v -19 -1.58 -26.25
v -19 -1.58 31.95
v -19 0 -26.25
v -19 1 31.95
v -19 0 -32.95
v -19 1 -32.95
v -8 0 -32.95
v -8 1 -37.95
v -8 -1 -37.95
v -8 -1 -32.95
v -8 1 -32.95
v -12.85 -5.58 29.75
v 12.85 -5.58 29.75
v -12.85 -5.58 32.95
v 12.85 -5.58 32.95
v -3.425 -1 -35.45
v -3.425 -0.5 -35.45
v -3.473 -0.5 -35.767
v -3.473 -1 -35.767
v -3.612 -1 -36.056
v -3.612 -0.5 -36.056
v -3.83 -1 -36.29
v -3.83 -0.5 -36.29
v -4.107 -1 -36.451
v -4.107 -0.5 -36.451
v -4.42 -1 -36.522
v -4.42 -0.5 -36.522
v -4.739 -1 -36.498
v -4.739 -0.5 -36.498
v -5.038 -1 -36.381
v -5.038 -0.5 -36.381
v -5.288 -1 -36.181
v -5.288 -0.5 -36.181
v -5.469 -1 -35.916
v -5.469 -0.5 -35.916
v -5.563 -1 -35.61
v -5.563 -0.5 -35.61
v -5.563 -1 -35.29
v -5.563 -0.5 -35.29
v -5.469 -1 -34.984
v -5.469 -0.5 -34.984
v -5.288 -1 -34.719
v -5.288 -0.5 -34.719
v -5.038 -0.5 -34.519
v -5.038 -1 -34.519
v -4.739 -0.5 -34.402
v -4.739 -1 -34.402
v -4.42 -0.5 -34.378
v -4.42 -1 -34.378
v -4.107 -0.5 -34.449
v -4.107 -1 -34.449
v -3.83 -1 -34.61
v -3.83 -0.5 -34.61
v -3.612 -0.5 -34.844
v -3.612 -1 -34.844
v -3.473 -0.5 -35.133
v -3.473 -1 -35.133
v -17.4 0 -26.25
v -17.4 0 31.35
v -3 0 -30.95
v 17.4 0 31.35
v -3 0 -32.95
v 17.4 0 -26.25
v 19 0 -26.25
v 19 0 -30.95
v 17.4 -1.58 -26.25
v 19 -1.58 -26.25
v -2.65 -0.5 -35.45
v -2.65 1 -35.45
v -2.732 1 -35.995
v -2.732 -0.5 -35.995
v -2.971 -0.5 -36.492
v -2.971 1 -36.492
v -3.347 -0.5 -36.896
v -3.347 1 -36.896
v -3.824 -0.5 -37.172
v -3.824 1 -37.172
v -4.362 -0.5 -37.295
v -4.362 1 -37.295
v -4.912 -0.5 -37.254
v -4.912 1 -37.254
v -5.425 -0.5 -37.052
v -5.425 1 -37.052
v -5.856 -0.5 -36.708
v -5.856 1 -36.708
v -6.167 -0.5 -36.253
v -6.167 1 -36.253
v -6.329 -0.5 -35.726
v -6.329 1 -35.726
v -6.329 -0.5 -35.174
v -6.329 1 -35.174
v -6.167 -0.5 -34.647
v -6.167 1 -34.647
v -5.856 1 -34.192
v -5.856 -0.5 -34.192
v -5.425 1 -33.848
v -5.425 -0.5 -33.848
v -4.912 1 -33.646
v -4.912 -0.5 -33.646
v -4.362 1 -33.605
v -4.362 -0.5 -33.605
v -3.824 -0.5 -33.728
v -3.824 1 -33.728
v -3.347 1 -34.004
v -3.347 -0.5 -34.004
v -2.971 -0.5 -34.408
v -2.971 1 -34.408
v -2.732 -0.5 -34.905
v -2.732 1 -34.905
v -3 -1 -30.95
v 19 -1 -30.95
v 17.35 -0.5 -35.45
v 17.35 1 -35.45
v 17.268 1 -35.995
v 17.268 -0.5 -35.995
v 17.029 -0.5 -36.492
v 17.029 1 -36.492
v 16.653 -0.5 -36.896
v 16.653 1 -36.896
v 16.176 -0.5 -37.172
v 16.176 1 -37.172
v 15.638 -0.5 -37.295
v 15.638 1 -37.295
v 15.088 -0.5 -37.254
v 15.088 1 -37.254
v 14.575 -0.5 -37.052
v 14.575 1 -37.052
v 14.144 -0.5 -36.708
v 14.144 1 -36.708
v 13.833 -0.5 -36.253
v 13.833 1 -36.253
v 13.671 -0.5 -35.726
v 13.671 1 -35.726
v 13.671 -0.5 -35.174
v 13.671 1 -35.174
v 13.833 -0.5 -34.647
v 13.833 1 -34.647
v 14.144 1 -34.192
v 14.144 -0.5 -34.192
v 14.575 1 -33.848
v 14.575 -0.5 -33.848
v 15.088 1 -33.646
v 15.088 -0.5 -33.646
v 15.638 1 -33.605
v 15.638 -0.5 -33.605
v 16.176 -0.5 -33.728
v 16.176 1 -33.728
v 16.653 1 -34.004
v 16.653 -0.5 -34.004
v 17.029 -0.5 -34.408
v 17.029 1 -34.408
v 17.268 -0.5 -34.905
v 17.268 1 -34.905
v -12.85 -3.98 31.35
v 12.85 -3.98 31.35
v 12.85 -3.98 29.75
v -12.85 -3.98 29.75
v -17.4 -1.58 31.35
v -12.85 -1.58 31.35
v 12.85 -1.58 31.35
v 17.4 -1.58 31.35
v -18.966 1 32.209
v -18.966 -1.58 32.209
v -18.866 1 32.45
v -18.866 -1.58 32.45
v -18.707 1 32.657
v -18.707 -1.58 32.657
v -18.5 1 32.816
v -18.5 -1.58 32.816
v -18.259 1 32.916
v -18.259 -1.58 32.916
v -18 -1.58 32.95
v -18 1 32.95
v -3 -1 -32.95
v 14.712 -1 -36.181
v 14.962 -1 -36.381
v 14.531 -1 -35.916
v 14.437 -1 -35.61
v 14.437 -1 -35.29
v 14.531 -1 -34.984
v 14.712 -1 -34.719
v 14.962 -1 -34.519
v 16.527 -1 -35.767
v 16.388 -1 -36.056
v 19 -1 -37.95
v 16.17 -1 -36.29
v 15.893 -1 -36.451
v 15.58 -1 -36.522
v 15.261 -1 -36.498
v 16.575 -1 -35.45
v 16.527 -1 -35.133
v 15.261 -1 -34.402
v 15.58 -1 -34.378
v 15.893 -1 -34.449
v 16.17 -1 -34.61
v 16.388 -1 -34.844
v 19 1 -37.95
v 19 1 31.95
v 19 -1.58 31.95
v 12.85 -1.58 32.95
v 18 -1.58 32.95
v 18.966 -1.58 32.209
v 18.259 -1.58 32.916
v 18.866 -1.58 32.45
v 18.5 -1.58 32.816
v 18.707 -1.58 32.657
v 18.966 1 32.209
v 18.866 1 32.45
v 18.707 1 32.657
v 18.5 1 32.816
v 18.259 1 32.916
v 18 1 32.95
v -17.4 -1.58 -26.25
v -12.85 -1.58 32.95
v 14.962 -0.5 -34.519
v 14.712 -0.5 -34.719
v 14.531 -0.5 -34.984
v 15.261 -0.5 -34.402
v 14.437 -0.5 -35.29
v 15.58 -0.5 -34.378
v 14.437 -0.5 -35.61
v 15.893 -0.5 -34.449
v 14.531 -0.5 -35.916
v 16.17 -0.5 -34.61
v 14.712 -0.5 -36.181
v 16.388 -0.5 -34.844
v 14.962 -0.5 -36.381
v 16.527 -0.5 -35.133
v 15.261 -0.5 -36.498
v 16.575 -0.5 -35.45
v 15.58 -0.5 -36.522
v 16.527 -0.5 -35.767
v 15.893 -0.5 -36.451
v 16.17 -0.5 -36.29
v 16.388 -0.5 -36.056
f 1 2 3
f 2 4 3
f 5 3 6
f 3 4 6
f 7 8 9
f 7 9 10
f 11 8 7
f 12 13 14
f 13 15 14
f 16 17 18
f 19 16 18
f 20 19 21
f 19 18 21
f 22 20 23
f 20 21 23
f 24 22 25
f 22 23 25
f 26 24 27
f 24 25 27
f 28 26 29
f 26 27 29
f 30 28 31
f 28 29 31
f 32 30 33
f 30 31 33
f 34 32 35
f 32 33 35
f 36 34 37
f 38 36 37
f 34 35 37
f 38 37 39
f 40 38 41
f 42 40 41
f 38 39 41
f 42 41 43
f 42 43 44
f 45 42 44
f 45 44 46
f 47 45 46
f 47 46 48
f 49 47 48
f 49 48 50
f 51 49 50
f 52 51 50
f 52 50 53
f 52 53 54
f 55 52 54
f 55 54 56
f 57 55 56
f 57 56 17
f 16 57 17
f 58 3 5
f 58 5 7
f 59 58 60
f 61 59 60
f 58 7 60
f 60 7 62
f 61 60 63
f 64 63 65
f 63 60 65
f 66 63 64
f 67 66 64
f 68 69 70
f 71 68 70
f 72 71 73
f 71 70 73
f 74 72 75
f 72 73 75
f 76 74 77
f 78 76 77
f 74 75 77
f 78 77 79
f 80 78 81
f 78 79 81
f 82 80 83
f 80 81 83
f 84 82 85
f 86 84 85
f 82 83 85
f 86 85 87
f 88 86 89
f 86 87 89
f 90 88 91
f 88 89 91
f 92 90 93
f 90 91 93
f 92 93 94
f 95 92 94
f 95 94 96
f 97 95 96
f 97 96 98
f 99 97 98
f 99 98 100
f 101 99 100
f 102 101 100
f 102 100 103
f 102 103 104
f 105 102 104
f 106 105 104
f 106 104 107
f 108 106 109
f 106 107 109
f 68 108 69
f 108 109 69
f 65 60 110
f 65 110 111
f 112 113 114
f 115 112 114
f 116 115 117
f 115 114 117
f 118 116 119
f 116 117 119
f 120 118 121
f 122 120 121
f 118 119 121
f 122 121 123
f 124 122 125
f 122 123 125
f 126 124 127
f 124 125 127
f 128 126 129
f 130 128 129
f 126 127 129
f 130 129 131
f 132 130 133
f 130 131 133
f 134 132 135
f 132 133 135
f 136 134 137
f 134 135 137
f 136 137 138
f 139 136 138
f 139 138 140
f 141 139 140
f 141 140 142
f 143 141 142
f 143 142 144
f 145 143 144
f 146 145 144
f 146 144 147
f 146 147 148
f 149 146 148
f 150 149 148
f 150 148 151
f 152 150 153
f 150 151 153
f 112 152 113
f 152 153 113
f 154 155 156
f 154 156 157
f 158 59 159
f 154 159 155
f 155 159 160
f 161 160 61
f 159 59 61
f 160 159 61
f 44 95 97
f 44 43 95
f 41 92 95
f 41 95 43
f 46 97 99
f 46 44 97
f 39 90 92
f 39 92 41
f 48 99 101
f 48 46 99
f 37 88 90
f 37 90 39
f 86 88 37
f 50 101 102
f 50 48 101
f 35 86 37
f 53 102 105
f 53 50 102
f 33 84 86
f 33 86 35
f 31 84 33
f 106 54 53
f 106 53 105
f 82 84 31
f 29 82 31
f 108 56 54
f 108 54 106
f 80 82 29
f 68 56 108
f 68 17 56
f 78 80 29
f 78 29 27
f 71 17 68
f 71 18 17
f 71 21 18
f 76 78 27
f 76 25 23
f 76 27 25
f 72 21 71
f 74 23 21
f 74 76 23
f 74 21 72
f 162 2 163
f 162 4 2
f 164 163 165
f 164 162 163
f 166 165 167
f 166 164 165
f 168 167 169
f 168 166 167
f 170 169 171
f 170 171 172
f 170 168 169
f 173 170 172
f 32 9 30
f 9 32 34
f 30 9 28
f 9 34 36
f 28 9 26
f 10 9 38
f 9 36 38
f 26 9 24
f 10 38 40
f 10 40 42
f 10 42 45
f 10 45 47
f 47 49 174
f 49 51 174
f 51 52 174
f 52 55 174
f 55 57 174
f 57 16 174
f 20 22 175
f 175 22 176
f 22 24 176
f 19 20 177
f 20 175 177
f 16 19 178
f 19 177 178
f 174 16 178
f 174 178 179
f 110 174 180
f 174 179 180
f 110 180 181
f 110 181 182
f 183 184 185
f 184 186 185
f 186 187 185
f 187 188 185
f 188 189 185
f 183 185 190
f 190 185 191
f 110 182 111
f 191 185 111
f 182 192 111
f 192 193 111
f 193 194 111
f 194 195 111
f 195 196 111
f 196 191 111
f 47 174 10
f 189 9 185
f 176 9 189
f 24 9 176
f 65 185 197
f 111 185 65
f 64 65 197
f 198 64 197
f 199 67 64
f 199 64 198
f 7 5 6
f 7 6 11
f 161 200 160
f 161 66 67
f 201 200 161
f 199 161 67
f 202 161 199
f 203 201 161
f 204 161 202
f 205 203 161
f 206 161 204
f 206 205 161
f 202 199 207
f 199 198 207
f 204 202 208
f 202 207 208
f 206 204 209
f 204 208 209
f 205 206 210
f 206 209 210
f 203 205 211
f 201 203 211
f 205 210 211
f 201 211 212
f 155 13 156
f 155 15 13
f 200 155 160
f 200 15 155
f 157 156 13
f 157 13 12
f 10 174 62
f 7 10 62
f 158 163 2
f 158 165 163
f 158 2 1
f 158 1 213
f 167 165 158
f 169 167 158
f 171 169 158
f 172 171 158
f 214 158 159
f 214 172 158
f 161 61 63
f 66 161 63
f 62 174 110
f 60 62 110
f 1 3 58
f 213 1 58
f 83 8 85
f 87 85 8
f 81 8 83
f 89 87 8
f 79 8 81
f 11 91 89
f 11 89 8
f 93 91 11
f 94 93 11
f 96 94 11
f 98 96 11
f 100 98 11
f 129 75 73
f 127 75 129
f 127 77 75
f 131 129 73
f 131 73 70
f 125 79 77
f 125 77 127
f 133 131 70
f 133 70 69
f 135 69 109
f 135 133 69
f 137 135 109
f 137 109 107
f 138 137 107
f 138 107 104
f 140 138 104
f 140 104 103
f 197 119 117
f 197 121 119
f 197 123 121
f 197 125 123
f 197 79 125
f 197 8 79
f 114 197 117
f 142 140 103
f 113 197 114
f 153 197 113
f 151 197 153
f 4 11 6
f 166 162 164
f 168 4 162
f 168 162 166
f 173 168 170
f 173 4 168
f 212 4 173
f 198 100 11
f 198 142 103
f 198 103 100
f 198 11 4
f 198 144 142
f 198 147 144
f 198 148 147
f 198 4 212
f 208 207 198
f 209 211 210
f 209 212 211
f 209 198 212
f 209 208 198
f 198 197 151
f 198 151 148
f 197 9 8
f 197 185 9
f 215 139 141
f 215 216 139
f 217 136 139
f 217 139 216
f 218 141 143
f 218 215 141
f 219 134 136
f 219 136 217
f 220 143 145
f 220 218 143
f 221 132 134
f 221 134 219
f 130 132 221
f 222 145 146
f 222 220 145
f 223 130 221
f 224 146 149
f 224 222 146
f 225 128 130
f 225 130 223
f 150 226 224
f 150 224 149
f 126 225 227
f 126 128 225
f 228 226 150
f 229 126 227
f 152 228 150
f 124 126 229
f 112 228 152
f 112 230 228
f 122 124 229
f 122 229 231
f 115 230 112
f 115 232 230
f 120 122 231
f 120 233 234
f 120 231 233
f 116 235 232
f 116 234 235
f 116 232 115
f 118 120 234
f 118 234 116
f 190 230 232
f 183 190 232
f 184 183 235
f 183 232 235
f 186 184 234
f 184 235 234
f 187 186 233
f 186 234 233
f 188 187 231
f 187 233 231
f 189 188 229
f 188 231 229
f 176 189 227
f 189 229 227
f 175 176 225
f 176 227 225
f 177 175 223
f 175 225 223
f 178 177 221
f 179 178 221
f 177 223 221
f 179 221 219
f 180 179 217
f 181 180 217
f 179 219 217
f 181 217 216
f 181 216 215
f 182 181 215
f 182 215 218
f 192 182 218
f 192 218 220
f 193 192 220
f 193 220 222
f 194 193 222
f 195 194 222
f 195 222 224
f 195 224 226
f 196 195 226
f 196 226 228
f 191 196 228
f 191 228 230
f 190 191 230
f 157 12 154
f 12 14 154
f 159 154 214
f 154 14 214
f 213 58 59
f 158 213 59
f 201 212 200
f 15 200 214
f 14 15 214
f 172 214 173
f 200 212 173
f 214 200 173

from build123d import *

# Parameters (mm, degrees)
SKETCH1_W                = 38
SKETCH1_H                = 65.9
BOSS_EXTRUDE1_DEPTH      = 1
BOSS_EXTRUDE2_DEPTH      = 1.58
SKETCH3_W                = 25.7
SKETCH3_H                = 1.6
BOSS_EXTRUDE3_DEPTH      = 4
SKETCH4_W                = 25.7
SKETCH4_H                = 1.6
BOSS_EXTRUDE4_DEPTH      = 1.6
FILLET1_R                = 1
SKETCH6_W                = 22
SKETCH6_H                = 7
BOSS_EXTRUDE5_DEPTH      = 1
BOSS_EXTRUDE5_DEPTH_BACK = 1
SKETCH9_W                = 5
SKETCH9_H                = 2
BOSS_EXTRUDE6_DEPTH      = 5
SKETCH7_R                = 1.075
CUT_EXTRUDE2_DEPTH       = 7.58
SKETCH8_R                = 1.85
CUT_EXTRUDE3_DEPTH       = 1.5


with BuildPart() as part:
    # Sketch1 → Boss-Extrude1 (new body)
    with BuildSketch(Plane(origin=(0, 0, 0), x_dir=(1, 0, 0), z_dir=(0, 1, 0))):
        Rectangle(SKETCH1_W, SKETCH1_H)
    extrude(amount=BOSS_EXTRUDE1_DEPTH)

    # Sketch2 → Boss-Extrude2 (add)
    with BuildSketch(Plane.XZ):
        Polygon((-19, 32.95), (-19, -26.25), (-17.4, -26.25), (-17.4, 31.35), (17.4, 31.35), (17.4, -26.25), (19, -26.25), (19, 32.95), align=None)
    extrude(amount=BOSS_EXTRUDE2_DEPTH)

    # Sketch3 → Boss-Extrude3 (add)
    with BuildSketch(Plane.XZ.offset(1.58)):
        with Locations((0, 32.15)):
            Rectangle(SKETCH3_W, SKETCH3_H)
    extrude(amount=BOSS_EXTRUDE3_DEPTH)

    # Sketch4 → Boss-Extrude4 (add)
    with BuildSketch(Plane(origin=(0, 0, 31.35), x_dir=(-1, 0, 0), z_dir=(0, 0, -1))):
        with Locations((0, -4.78)):
            Rectangle(SKETCH4_W, SKETCH4_H)
    extrude(amount=BOSS_EXTRUDE4_DEPTH)

    # Fillet1
    fillet1_edges = [part.edges().sort_by_distance(p)[0] for p in [
        (19, -0.29, 32.95),
        (-19, -0.29, 32.95),
    ]]
    fillet(fillet1_edges, radius=FILLET1_R)

    # Sketch6 → Boss-Extrude5 (add, two sides)
    with BuildSketch(Plane.XZ) as boss_extrude5_sk:
        with Locations((8, -34.45)):
            Rectangle(SKETCH6_W, SKETCH6_H)
    extrude(amount=BOSS_EXTRUDE5_DEPTH)
    extrude(boss_extrude5_sk.sketch, amount=-BOSS_EXTRUDE5_DEPTH_BACK)

    # Sketch9 → Boss-Extrude6 (add)
    with BuildSketch(Plane.ZY.offset(3)):
        with Locations((-35.45, 0)):
            Rectangle(SKETCH9_W, SKETCH9_H)
    extrude(amount=BOSS_EXTRUDE6_DEPTH)

    # Sketch7 → Cut-Extrude2 (cut, through all)
    with BuildSketch(Plane(origin=(0, 1, 0), x_dir=(1, 0, 0), z_dir=(0, 1, 0))):
        with Locations((-4.5, 35.45)):
            Circle(SKETCH7_R)
        with Locations((15.5, 35.45)):
            Circle(SKETCH7_R)
    extrude(amount=-CUT_EXTRUDE2_DEPTH, mode=Mode.SUBTRACT)

    # Sketch8 → Cut-Extrude3 (cut)
    with BuildSketch(Plane(origin=(0, 1, 0), x_dir=(1, 0, 0), z_dir=(0, 1, 0))):
        with Locations((-4.5, 35.45)):
            Circle(SKETCH8_R)
        with Locations((15.5, 35.45)):
            Circle(SKETCH8_R)
    extrude(amount=-CUT_EXTRUDE3_DEPTH, mode=Mode.SUBTRACT)


solid = part.part
